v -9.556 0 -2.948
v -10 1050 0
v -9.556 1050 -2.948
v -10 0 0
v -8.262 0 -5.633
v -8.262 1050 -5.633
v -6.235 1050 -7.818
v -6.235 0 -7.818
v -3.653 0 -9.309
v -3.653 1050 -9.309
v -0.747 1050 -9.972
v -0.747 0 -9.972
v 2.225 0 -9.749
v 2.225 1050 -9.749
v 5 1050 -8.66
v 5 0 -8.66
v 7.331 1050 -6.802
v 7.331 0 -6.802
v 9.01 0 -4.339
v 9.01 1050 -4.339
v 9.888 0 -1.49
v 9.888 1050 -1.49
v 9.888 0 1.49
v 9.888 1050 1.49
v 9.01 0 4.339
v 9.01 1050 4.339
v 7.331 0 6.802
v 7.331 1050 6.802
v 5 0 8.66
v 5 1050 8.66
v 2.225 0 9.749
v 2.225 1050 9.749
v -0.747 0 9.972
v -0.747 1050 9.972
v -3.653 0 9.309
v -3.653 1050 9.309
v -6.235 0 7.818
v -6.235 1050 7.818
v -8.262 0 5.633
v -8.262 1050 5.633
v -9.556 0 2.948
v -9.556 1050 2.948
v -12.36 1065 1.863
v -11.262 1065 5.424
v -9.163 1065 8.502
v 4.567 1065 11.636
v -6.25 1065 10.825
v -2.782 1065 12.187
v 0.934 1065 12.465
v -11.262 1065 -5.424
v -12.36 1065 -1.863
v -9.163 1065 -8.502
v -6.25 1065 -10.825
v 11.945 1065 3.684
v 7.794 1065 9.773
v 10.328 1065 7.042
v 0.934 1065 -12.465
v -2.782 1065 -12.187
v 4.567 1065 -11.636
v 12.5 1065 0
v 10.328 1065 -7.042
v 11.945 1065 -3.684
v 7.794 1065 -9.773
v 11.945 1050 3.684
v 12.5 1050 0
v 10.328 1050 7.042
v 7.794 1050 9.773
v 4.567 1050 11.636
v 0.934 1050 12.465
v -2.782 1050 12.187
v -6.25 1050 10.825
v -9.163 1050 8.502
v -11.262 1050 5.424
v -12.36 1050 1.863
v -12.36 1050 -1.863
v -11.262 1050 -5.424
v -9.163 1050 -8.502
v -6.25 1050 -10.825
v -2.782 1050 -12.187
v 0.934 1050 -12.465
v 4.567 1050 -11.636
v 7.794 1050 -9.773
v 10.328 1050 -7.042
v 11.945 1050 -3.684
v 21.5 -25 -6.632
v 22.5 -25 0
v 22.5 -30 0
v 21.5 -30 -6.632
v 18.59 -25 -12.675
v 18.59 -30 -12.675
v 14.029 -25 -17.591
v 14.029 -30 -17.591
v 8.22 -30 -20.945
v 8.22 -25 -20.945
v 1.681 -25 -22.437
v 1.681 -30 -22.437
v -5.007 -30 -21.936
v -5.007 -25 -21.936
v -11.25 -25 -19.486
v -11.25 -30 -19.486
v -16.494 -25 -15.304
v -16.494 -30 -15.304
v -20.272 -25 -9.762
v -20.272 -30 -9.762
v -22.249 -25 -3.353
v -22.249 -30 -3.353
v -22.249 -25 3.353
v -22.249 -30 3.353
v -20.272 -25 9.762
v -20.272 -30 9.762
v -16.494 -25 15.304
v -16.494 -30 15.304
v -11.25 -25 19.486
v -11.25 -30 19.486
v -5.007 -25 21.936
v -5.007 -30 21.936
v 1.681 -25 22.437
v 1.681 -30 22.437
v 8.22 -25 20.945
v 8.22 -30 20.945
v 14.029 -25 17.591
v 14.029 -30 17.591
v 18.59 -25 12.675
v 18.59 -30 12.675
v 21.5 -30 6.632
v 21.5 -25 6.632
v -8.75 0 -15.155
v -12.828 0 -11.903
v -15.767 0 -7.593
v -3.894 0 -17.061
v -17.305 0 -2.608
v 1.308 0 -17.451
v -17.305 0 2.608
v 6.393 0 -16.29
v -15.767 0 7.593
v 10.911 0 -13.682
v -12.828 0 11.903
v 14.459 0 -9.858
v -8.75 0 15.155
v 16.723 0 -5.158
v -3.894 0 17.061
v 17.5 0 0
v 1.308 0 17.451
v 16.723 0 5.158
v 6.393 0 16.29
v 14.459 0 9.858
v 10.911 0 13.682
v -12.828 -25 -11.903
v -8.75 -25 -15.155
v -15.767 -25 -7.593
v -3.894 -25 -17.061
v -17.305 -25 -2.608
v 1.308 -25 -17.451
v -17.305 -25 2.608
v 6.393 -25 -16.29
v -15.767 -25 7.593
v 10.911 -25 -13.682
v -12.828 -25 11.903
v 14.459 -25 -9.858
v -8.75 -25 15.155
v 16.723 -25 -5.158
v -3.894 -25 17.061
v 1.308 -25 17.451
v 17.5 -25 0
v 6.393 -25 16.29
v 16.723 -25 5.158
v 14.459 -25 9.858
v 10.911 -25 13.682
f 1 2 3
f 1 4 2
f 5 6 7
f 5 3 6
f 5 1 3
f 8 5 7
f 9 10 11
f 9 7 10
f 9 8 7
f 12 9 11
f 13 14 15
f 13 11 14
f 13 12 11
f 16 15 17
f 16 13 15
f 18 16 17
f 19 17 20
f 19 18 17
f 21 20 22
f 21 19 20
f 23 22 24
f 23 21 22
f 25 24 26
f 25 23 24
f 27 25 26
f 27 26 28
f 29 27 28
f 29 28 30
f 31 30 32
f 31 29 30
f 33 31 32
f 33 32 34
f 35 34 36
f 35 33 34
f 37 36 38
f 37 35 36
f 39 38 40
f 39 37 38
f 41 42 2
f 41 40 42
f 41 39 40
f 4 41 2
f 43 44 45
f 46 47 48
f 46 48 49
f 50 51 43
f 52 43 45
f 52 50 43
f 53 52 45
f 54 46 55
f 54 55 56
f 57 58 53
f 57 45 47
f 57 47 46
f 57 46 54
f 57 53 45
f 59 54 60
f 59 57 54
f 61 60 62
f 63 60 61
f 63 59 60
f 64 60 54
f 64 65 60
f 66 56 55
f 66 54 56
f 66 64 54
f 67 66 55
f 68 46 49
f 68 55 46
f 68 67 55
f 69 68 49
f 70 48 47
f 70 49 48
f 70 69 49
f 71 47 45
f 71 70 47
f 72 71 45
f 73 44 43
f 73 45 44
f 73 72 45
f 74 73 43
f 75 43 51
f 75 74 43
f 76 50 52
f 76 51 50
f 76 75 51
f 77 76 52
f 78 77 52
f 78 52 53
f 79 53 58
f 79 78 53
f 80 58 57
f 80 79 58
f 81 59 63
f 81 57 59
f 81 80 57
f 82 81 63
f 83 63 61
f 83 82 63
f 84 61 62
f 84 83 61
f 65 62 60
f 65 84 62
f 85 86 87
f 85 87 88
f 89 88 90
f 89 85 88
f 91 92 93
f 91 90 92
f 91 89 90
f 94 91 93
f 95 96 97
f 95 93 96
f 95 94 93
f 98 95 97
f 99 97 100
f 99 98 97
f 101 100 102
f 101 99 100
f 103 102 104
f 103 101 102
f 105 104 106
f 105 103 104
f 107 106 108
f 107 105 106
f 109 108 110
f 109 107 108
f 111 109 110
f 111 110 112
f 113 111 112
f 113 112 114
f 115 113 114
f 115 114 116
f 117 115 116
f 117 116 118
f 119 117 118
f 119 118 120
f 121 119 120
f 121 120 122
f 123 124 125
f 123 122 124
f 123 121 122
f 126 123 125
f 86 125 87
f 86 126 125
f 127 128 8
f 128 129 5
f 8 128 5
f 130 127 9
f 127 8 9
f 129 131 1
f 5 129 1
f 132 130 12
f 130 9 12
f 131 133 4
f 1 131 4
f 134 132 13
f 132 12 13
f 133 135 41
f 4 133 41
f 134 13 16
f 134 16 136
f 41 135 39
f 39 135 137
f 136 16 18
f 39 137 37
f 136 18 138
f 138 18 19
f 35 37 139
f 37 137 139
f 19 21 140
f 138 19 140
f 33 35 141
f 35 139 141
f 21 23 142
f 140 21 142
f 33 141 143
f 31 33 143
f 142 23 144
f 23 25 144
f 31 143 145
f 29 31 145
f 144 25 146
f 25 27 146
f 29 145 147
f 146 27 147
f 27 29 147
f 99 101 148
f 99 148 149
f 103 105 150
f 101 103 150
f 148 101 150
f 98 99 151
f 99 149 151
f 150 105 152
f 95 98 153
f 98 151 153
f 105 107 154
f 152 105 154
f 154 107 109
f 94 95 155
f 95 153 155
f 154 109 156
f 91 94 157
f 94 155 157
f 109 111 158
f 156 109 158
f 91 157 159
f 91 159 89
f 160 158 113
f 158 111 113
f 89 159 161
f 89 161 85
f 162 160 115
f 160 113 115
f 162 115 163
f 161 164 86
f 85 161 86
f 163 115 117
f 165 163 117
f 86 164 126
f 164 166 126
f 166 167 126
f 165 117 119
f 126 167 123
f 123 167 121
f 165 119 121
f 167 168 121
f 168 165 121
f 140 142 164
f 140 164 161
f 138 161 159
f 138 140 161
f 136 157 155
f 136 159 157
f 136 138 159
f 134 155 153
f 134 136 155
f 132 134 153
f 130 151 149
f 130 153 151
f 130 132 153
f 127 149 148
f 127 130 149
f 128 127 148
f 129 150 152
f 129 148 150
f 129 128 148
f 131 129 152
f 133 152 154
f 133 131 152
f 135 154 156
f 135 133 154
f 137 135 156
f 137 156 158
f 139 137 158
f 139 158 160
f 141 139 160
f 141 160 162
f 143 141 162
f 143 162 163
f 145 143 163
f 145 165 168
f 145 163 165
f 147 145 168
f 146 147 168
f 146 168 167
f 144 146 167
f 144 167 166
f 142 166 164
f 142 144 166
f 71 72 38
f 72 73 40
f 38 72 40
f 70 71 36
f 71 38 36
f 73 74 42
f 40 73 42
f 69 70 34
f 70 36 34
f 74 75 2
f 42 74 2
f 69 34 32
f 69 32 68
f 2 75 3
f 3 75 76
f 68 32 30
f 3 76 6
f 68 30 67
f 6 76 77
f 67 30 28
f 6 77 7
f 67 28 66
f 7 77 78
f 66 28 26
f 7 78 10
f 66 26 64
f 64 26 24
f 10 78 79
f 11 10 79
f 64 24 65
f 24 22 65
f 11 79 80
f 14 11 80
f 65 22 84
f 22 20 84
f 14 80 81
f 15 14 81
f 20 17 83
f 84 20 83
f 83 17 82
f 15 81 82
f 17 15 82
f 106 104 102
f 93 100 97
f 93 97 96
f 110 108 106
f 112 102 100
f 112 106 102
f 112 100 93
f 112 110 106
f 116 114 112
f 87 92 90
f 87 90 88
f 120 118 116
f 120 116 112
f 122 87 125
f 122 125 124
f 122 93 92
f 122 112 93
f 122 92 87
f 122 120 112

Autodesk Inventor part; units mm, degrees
ref_plane "YZ Plane" through (0, 0, 0) normal (1, 0, 0) x (0, 1, 0)
ref_plane "XZ Plane" through (0, 0, 0) normal (0, 1, 0) x (-1, 0, 0)
ref_plane "XY Plane" through (0, 0, 0) normal (0, 0, 1) x (1, 0, 0)
sketch "Sketch1" plane through (0, 0, 0) normal (0, 1, 0) x (-1, 0, 0)
  circle A0 centre (0, 0) radius 10
  dimension "d0" = 20
extrude "Extrusion1" add sketch "Sketch1" along normal blind 1050
sketch "Sketch2" plane through (0, 0, 0) normal (0, -1, 0) x (1, 0, 0)
  circle A0 centre (0, 0) radius 10 projected
  circle A1 centre (0, 0) radius 17.5
  dimension "d3" = 35
extrude "Extrusion2" add sketch "Sketch2" along normal blind 25 contours A0 | A1
sketch "Sketch3" plane through (0, -25, 0) normal (0, -1, 0) x (1, 0, 0)
  circle A0 centre (0, 0) radius 22.5
  dimension "d6" = 45
extrude "Extrusion3" add sketch "Sketch3" along normal blind 5
sketch "Sketch4" plane through (0, 1050, 0) normal (0, 1, 0) x (1, 0, 0)
  circle A0 centre (0, 0) radius 12.5
  dimension "d9" = 25
extrude "Extrusion4" add sketch "Sketch4" along normal blind 15
properties part number "linear_rod"
